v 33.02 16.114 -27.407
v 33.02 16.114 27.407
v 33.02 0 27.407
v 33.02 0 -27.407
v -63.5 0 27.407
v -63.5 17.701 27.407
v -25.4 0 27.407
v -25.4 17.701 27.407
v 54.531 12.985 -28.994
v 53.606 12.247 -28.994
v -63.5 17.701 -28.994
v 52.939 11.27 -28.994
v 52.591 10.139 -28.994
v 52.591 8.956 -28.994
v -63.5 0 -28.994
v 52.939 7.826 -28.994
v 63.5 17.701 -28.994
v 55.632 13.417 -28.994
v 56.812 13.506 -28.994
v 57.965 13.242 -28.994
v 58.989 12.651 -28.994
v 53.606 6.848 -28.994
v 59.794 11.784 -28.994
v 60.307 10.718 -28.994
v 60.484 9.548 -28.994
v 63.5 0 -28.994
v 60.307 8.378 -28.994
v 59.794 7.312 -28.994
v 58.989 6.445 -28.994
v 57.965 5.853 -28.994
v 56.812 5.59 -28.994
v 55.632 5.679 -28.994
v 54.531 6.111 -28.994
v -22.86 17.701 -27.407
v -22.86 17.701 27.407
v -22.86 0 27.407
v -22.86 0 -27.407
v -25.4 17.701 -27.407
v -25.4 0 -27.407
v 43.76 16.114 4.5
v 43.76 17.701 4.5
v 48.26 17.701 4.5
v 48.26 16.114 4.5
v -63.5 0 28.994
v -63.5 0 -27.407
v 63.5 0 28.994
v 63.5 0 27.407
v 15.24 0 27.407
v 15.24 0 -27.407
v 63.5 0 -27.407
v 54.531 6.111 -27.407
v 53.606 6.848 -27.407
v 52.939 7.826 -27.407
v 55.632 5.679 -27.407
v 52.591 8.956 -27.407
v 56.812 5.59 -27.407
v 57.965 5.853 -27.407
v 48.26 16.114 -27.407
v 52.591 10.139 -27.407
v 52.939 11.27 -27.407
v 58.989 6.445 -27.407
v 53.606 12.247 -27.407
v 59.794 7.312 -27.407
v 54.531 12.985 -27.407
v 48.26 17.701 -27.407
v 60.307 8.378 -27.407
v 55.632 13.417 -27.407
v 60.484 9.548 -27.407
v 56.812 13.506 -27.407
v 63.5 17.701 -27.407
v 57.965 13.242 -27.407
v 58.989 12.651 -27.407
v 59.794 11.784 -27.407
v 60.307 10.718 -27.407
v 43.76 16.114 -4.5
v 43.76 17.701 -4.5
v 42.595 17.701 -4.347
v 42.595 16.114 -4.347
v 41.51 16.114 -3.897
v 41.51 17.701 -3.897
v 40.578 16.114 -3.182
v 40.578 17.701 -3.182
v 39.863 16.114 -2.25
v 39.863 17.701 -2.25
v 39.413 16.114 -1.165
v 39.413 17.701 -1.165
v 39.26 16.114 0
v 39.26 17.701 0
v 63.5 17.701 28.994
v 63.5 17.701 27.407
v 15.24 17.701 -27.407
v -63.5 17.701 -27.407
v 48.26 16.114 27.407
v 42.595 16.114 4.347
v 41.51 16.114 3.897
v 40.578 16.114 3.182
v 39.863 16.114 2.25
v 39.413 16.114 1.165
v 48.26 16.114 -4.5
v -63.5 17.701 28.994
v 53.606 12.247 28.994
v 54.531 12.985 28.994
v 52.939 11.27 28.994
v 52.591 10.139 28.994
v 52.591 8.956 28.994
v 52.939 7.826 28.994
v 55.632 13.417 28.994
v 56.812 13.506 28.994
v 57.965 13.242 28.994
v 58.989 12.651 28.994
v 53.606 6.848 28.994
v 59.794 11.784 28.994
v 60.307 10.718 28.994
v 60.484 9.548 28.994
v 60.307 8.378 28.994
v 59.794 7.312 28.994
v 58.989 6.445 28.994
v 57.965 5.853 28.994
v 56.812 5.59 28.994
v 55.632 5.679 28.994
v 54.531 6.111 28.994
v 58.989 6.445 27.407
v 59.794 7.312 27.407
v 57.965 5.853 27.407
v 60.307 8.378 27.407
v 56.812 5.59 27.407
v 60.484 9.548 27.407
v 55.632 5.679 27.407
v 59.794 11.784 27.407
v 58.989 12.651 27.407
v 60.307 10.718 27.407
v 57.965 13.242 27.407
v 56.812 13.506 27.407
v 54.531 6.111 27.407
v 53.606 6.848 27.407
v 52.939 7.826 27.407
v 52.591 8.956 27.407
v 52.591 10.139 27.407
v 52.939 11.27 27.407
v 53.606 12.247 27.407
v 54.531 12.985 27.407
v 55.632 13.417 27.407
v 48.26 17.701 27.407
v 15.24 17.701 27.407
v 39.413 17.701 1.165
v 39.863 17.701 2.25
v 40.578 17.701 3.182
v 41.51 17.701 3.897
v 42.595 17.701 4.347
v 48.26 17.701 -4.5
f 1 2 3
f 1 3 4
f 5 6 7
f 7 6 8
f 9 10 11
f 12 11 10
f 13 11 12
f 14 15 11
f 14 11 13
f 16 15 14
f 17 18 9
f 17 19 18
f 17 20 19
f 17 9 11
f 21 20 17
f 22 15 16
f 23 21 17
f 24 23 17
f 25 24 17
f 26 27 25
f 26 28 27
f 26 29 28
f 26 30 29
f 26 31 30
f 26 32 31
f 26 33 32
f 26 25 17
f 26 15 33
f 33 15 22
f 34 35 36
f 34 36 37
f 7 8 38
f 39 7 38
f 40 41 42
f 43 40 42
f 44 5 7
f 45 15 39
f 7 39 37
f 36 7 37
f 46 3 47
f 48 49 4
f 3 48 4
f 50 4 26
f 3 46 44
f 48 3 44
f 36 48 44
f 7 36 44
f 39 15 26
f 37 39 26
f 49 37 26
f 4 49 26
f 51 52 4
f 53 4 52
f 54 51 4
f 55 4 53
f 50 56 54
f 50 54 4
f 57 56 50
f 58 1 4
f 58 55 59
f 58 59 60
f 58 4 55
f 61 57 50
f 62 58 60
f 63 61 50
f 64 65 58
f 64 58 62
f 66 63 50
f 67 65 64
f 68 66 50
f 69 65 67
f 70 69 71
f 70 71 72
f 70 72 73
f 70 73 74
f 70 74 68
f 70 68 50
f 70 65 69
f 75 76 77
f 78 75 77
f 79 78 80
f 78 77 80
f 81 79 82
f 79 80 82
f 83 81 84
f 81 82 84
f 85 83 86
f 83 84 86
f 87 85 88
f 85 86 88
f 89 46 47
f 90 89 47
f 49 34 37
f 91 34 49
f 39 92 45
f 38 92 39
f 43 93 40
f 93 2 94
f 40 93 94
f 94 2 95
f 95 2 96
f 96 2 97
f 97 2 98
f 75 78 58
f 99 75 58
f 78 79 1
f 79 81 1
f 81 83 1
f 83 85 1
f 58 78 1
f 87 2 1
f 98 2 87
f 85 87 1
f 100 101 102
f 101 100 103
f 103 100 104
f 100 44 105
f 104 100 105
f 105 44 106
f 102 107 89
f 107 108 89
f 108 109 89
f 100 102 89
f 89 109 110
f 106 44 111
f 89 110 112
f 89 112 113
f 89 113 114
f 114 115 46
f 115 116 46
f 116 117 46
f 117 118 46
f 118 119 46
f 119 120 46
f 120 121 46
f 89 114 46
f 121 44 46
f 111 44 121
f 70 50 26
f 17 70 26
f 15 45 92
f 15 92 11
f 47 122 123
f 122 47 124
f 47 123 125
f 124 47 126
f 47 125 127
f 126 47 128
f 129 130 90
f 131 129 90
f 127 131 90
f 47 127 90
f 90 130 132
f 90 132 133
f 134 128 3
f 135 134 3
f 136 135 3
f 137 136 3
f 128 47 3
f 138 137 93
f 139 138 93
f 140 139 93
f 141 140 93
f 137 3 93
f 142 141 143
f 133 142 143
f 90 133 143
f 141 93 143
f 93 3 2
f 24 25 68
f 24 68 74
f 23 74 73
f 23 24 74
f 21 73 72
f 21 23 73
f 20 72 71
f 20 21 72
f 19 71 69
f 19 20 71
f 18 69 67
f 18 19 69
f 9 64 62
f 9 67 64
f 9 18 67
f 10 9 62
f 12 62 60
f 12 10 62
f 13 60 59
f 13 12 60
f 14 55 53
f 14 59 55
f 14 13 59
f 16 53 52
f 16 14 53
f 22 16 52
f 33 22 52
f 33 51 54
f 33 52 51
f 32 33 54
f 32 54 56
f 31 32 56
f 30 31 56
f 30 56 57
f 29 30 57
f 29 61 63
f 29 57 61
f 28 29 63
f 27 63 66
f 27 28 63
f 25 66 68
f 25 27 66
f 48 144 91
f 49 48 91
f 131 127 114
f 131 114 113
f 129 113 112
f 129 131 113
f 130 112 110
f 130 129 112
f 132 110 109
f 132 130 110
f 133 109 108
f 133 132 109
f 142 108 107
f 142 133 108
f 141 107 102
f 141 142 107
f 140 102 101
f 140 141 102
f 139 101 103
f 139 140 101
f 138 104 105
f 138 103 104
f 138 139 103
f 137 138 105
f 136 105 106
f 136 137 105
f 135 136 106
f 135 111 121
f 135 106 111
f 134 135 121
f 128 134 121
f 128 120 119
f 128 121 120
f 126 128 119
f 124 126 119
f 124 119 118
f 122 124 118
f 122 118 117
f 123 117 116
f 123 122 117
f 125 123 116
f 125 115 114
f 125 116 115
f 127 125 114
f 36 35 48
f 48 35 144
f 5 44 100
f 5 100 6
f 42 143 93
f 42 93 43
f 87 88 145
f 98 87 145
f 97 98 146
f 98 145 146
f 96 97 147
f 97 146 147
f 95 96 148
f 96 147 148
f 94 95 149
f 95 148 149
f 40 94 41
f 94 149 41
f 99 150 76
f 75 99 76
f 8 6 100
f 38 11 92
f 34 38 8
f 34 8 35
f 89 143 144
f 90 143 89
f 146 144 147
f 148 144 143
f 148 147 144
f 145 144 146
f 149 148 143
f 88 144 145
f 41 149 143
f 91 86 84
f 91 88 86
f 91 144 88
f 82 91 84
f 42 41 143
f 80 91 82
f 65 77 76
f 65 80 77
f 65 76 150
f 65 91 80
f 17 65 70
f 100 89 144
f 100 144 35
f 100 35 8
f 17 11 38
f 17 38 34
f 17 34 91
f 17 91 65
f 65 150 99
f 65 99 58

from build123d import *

# Parameters (mm, degrees)
SKETCH1_W               = 127
SKETCH1_H               = 57.9882
BOSS_EXTRUDE1_DEPTH     = 17.70126
SKETCH2_W               = 15.24
SKETCH2_H               = 54.8132
CUT_EXTRUDE1_DEPTH      = 73.015570819
CUT_EXTRUDE2_DEPTH      = 87.756115439
CUT_EXTRUDE2_DEPTH_BACK = 87.756115439
SKETCH3_R               = 3.96875
CUT_EXTRUDE5_DEPTH      = 117.808775528
CUT_EXTRUDE5_DEPTH_BACK = 15.24
SKETCH6_W               = 54.8132
SKETCH6_H               = 16.11376
CUT_EXTRUDE6_DEPTH      = 73.015570819
SKETCH7_W               = 38.1
SKETCH7_H               = 54.8132
CUT_EXTRUDE7_DEPTH      = 73.015570819
SKETCH8_W               = 38.1
SKETCH8_H               = 54.8132
CUT_EXTRUDE8_DEPTH      = 73.015570819


with BuildPart() as part:
    # Sketch1 → Boss-Extrude1 (new body)
    with BuildSketch(Plane(origin=(0, 0, 0), x_dir=(1, 0, 0), z_dir=(0, 1, 0))):
        Rectangle(SKETCH1_W, SKETCH1_H)
    extrude(amount=BOSS_EXTRUDE1_DEPTH)

    # Sketch2 → Cut-Extrude1 (cut, through all)
    with BuildSketch(Plane(origin=(0, 17.70126, 0), x_dir=(1, 0, 0), z_dir=(0, 1, 0))):
        with Locations((55.88, 0)):
            Rectangle(SKETCH2_W, SKETCH2_H)
    extrude(amount=-CUT_EXTRUDE1_DEPTH, mode=Mode.SUBTRACT)

    # Sketch3 → Cut-Extrude2 (cut, two sides: drawn at the far end of the back side and taken through both)
    with BuildSketch(Plane.XY.offset(-27.4066).offset(-CUT_EXTRUDE2_DEPTH_BACK)):
        with Locations((56.515, 9.54786)):
            Circle(SKETCH3_R)
    extrude(amount=CUT_EXTRUDE2_DEPTH + CUT_EXTRUDE2_DEPTH_BACK, mode=Mode.SUBTRACT)

    # Sketch6 → Cut-Extrude5 (cut, two sides: drawn at the far end of the back side and taken through both)
    with BuildSketch(Plane(origin=(48.26, 0, 0), x_dir=(0, 0, -1), z_dir=(1, 0, 0)).offset(-CUT_EXTRUDE5_DEPTH_BACK)):
        with Locations((0, 8.05688)):
            Rectangle(SKETCH6_W, SKETCH6_H)
    extrude(amount=CUT_EXTRUDE5_DEPTH + CUT_EXTRUDE5_DEPTH_BACK, mode=Mode.SUBTRACT)

    # Sketch4 → Cut-Extrude6 (cut, through all)
    with BuildSketch(Plane(origin=(0, 17.70126, 0), x_dir=(1, 0, 0), z_dir=(0, 1, 0))):
        with BuildLine():
            ThreePointArc((43.759999983, 4.500000017), (40.578019456, 3.181980527), (39.259999966, 0))
            Line((39.259999966, 0), (48.26, 0))
            ThreePointArc((48.26, 0), (46.94198051, 3.181980527), (43.759999983, 4.500000017))
        make_face()
        with BuildLine():
            Line((48.26, 0), (39.259999966, 0))
            ThreePointArc((39.259999966, 0), (40.578019456, -3.181980527), (43.759999983, -4.500000017))
            ThreePointArc((43.759999983, -4.500000017), (46.94198051, -3.181980527), (48.26, 0))
        make_face()
        with BuildLine():
            ThreePointArc((43.759999983, 4.500000017), (46.94198051, 3.181980527), (48.26, 0))
            Line((48.26, 0), (48.26, 4.500000017))
            Line((48.26, 4.500000017), (43.759999983, 4.500000017))
        make_face()
        with BuildLine():
            Line((48.26, -4.500000017), (48.26, 0))
            ThreePointArc((48.26, 0), (46.94198051, -3.181980527), (43.759999983, -4.500000017))
            Line((43.759999983, -4.500000017), (48.26, -4.500000017))
        make_face()
    extrude(amount=-CUT_EXTRUDE6_DEPTH, mode=Mode.SUBTRACT)

    # Sketch7 → Cut-Extrude7 (cut, through all)
    with BuildSketch(Plane(origin=(0, 17.70126, 0), x_dir=(1, 0, 0), z_dir=(0, 1, 0))):
        with Locations((-44.45, 0)):
            Rectangle(SKETCH7_W, SKETCH7_H)
    extrude(amount=-CUT_EXTRUDE7_DEPTH, mode=Mode.SUBTRACT)

    # Sketch8 → Cut-Extrude8 (cut, through all)
    with BuildSketch(Plane(origin=(0, 17.70126, 0), x_dir=(1, 0, 0), z_dir=(0, 1, 0))):
        with Locations((-3.81, 0)):
            Rectangle(SKETCH8_W, SKETCH8_H)
    extrude(amount=-CUT_EXTRUDE8_DEPTH, mode=Mode.SUBTRACT)


solid = part.part
